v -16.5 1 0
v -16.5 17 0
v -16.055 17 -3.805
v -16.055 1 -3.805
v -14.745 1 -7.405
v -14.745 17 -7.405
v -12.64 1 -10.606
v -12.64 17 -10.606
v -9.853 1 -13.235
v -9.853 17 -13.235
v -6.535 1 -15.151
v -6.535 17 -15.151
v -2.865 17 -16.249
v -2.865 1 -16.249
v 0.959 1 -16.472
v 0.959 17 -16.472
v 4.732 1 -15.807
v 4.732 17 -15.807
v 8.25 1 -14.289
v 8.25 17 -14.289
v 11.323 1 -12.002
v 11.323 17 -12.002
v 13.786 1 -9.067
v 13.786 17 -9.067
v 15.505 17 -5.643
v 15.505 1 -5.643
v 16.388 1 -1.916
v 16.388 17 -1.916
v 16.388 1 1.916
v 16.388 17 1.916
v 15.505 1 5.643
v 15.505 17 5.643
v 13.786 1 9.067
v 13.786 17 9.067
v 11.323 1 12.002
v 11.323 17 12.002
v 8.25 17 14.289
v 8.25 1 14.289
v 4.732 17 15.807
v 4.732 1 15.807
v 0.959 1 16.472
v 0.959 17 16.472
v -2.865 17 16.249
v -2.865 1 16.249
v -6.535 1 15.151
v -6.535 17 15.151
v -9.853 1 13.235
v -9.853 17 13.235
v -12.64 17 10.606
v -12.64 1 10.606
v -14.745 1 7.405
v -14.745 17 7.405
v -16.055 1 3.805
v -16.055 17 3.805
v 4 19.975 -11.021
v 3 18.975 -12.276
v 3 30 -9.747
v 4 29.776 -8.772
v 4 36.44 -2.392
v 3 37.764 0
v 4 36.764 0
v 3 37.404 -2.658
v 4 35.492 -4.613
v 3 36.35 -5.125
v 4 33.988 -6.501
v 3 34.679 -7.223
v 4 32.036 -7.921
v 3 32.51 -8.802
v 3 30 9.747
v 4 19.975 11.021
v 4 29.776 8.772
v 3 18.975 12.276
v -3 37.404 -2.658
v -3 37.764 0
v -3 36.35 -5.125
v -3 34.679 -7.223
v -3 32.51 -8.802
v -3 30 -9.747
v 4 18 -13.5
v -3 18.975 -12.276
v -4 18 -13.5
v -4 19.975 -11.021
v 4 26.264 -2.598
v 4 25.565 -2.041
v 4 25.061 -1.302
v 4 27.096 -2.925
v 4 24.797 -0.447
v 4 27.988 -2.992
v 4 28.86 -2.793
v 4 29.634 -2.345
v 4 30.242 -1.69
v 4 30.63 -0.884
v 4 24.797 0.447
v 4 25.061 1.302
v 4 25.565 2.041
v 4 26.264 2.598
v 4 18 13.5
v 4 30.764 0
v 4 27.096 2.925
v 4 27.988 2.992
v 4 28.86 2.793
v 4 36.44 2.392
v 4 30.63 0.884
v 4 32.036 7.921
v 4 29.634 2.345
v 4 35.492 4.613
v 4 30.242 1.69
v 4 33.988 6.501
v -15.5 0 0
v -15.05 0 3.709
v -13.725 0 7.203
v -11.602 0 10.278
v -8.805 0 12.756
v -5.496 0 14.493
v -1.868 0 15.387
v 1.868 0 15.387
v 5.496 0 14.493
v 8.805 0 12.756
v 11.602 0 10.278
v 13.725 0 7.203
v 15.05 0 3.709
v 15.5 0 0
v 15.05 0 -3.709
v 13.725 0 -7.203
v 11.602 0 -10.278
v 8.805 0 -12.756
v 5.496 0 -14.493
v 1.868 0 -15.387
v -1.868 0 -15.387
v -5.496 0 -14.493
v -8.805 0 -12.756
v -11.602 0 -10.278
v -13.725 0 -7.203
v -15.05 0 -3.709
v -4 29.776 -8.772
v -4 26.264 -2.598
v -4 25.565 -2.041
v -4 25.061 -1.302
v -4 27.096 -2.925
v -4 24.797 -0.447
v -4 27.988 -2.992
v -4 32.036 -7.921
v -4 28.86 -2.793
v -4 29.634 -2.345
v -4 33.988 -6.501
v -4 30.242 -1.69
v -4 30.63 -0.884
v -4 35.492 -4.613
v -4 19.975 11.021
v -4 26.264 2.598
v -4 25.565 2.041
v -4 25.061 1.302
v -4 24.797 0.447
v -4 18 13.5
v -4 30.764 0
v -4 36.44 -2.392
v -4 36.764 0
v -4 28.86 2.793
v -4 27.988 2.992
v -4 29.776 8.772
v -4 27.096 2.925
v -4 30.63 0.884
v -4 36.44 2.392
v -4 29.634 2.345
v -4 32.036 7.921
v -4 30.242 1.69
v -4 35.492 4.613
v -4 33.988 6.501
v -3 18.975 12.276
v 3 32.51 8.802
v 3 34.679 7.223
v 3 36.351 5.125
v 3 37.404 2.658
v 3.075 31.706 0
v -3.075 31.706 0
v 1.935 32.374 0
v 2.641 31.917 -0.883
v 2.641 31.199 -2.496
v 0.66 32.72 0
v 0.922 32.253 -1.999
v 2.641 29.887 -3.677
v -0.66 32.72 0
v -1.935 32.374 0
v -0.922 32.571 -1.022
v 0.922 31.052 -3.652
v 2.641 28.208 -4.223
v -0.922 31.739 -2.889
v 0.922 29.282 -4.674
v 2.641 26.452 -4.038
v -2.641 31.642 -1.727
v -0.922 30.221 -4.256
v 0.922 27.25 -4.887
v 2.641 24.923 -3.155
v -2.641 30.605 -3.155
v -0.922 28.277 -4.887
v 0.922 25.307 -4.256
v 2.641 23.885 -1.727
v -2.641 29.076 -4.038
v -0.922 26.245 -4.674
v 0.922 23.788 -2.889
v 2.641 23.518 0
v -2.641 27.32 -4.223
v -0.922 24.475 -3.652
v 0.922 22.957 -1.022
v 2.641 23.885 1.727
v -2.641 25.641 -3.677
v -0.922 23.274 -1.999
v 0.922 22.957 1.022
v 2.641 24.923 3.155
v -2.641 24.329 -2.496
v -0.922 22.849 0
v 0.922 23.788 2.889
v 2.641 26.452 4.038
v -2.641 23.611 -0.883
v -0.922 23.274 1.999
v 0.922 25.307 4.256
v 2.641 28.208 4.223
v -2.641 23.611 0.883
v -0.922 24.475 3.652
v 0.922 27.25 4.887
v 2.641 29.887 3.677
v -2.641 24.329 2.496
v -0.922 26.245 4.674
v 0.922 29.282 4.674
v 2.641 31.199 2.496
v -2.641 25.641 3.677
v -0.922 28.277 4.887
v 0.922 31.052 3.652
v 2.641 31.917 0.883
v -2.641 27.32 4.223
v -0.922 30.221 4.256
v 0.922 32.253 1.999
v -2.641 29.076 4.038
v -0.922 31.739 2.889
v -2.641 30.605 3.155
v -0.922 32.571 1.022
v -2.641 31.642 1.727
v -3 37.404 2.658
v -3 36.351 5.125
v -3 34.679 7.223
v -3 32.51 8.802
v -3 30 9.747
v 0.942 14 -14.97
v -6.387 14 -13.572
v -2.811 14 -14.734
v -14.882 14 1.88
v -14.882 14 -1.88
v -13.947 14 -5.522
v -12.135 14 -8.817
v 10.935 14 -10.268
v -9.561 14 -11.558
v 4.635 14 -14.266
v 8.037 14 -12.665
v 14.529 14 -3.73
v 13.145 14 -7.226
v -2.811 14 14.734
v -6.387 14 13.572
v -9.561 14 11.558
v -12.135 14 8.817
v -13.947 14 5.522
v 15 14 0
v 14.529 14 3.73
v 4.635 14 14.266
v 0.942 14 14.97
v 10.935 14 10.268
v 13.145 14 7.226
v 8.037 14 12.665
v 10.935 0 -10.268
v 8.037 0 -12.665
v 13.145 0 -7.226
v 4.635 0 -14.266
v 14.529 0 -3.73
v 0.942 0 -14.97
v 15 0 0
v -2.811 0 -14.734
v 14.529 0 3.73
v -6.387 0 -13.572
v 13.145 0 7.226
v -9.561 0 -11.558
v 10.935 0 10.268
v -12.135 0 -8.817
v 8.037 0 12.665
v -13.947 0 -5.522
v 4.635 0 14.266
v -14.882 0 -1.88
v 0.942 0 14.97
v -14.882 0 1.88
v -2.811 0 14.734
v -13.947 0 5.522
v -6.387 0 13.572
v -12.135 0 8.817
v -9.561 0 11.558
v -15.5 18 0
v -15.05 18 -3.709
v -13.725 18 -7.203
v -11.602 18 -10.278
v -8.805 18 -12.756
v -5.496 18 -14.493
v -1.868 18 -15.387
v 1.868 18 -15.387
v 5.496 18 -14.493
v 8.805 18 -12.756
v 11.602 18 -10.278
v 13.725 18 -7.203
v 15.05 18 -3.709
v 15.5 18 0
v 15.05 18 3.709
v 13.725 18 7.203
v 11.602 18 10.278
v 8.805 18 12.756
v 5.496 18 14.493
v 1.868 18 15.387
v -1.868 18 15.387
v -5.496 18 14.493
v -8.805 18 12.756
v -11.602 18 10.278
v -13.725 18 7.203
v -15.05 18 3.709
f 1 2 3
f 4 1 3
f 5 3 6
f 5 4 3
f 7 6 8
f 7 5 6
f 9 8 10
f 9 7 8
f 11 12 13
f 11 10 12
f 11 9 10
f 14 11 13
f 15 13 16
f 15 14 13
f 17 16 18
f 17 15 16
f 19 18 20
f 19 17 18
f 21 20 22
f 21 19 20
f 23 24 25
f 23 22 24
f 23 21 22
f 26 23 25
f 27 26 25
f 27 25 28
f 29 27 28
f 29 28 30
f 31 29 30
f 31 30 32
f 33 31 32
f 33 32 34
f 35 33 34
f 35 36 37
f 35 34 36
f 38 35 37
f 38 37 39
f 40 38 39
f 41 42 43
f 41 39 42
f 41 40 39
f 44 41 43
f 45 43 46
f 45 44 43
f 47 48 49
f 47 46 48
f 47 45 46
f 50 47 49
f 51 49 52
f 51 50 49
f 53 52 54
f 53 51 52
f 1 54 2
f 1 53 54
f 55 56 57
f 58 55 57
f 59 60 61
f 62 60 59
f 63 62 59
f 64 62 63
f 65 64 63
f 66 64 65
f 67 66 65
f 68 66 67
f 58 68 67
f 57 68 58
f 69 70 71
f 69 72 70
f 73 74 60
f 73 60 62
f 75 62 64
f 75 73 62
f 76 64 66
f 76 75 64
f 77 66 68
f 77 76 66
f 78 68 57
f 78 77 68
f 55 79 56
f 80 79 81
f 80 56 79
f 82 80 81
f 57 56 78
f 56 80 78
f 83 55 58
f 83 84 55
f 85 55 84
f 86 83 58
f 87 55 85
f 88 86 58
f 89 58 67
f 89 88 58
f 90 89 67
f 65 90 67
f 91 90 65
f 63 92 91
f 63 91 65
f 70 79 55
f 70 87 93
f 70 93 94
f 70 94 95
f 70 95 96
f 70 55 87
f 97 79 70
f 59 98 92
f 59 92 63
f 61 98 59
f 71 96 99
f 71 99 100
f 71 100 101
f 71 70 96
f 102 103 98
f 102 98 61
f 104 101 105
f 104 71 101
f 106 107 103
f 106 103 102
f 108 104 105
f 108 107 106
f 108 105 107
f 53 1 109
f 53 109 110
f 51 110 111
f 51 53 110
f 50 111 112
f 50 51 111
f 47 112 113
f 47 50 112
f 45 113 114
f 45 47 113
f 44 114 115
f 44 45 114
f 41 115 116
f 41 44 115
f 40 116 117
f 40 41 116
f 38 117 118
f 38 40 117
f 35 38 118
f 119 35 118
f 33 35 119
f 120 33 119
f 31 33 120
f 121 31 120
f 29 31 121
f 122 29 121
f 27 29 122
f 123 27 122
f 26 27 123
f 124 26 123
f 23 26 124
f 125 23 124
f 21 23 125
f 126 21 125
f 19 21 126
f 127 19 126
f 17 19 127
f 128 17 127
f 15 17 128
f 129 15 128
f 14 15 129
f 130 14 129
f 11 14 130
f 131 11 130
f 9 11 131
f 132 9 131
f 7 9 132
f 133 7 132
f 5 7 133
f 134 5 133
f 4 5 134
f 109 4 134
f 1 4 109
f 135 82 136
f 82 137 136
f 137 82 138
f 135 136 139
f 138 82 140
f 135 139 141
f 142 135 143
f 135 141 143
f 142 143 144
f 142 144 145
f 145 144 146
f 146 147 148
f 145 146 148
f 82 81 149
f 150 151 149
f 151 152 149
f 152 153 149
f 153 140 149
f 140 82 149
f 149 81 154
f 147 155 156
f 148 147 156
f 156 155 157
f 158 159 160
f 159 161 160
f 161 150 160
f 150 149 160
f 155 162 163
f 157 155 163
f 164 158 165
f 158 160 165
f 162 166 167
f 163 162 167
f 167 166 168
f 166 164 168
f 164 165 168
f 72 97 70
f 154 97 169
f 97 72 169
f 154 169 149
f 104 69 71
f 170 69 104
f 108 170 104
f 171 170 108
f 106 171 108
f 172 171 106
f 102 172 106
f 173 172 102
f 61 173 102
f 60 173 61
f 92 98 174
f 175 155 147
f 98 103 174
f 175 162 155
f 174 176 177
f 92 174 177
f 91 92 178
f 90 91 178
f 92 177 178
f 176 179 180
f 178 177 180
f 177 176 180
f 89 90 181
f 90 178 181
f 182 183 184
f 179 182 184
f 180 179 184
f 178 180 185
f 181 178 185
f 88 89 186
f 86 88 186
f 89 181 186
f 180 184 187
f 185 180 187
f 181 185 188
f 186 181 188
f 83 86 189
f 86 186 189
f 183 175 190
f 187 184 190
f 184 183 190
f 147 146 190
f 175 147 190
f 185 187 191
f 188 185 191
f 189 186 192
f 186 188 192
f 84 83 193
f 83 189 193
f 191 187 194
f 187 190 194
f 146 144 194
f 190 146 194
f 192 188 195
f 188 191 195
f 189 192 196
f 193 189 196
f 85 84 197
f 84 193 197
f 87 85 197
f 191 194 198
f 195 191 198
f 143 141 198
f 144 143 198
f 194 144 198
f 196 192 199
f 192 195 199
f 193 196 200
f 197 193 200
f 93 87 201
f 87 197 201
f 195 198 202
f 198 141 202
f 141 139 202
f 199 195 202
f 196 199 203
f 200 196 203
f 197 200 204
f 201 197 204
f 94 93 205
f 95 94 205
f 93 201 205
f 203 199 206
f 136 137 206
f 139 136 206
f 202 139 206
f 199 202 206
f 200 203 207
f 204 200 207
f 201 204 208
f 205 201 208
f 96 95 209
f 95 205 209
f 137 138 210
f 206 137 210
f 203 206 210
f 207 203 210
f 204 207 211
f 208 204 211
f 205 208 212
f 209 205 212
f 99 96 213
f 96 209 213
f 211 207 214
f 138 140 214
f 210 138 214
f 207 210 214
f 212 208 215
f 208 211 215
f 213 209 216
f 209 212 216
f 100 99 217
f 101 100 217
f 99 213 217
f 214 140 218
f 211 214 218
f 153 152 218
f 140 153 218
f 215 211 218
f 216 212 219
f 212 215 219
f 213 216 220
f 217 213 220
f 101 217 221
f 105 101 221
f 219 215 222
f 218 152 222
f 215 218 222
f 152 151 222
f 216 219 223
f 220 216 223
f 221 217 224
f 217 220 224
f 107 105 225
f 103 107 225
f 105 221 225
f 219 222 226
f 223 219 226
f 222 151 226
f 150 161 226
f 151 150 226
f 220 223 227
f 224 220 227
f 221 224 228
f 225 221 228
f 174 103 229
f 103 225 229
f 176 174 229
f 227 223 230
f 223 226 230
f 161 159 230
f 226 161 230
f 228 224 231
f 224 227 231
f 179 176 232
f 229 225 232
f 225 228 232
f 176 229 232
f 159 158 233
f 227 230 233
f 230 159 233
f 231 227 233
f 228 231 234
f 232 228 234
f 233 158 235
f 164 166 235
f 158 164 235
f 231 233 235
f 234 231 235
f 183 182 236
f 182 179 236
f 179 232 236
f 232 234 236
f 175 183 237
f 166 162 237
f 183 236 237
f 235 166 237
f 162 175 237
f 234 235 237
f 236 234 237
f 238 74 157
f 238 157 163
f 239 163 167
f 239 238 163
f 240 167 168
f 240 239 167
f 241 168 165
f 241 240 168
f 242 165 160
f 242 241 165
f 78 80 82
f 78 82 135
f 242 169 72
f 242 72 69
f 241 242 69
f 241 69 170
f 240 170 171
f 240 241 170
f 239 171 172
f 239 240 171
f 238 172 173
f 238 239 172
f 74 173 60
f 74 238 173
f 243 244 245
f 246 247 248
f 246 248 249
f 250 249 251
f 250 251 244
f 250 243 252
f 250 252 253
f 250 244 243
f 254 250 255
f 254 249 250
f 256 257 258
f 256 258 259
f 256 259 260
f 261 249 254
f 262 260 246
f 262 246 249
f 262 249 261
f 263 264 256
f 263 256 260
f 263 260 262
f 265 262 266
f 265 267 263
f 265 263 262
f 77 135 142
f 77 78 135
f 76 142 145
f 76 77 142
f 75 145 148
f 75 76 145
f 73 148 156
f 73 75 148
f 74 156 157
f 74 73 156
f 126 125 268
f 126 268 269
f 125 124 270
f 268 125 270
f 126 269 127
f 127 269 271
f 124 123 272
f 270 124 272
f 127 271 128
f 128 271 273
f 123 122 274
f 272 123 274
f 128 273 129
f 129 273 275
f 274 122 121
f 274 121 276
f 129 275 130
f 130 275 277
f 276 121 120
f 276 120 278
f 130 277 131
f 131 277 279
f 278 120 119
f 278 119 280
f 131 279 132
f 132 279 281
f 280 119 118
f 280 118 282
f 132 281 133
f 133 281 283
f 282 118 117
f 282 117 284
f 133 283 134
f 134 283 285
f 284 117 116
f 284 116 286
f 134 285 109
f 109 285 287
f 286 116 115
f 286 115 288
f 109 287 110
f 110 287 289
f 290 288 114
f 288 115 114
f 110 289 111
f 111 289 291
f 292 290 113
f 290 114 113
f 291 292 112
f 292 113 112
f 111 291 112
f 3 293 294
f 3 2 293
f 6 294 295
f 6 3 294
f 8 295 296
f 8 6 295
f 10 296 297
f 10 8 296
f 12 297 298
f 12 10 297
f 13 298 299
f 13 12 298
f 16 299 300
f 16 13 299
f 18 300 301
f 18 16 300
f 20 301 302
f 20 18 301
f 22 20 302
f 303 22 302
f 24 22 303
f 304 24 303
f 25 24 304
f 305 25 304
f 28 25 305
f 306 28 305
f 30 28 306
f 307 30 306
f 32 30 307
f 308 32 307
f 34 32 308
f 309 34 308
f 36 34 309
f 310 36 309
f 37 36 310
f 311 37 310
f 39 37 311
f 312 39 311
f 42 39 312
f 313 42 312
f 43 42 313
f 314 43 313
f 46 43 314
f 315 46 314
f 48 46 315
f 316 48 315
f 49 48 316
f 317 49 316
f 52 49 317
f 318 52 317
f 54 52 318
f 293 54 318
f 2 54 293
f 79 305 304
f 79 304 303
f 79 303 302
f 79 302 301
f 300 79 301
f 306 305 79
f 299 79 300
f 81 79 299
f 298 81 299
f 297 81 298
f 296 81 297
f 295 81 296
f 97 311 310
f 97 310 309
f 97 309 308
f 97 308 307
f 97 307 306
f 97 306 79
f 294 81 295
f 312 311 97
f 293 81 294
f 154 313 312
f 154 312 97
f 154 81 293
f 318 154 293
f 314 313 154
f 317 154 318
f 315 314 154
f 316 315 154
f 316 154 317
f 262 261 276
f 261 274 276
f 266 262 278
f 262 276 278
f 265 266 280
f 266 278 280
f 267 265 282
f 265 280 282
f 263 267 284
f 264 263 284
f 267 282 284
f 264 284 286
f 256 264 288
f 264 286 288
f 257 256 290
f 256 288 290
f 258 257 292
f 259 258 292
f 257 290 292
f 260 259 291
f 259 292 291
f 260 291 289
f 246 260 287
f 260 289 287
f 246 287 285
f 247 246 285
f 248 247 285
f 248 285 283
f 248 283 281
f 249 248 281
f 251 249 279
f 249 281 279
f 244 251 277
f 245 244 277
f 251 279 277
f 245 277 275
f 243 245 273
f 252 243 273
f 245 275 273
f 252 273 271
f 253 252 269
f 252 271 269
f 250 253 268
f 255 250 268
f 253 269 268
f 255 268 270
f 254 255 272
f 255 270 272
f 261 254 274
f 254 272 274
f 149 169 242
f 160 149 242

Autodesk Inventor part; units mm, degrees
ref_plane "YZ Plane" through (0, 0, 0) normal (1, 0, 0) x (0, 1, 0)
ref_plane "XZ Plane" through (0, 0, 0) normal (0, 1, 0) x (-1, 0, 0)
ref_plane "XY Plane" through (0, 0, 0) normal (0, 0, 1) x (1, 0, 0)
sketch "Boceto1" plane through (0, 0, 0) normal (0, 1, 0) x (-1, 0, 0)
  circle A0 centre (0, 0) radius 16.5
  dimension "d0" = 33
extrude "Extrusión1" add sketch "Boceto1" along normal blind 18
sketch "Boceto3" plane through (0, 0, 0) normal (1, 0, 0) x (0, 1, 0)
  line L0 (18, -16.5) -> (18, 16.5) projected
  line L1 (18, -12.5) -> (30, -9.7467)
  arc A0 (30, -9.7467) -> (37.7637, 0) centre (27.7637, 0) ccw
  line L2 (18, 0) -> (51.6641, 0)
  line L3 (18, 12.5) -> (30, 9.7467)
  arc A1 (37.7637, 0) -> (30, 9.7467) centre (27.7637, 0) ccw
  line L4 (18, 12.5) -> (18, -12.5)
  point P0 (0, 0)
  dimension "d5" = 10
  dimension "d6" = 4
  dimension "d7" = 12
extrude "Extrusión2" add sketch "Boceto3" along normal mid plane 8
sketch "Boceto4" plane through (4, 0, 0) normal (1, 0, 0) x (0, 0, -1)
  arc A0 (9.7467, 30) -> (-9.7467, 30) centre (0, 27.7637) ccw projected
  circle A1 centre (0, 27.7637) radius 3
  point P0 (0, 0)
  dimension "d10" = 6
extrude "Extrusión3" cut sketch "Boceto4" against normal through all
sketch "Boceto6" plane through (0, 0, 0) normal (0, -1, 0) x (1, 0, 0)
  circle A0 centre (0, 0) radius 15
  dimension "d14" = 30
extrude "Extrusión4" cut sketch "Boceto6" against normal blind 14
chamfer "Chaflán1" distance 1 angle 45 10 edges at (16.5, 18, 0) (16.5, 0, 0) (-4, 37.7637, 0) (-4, 24, -11.1234) (-4, 24, 11.1234) (4, 37.7637, 0) (4, 24, 11.1234) (4, 24, -11.1234) (0, 18, 12.5) (0, 18, -12.5)
sketch "Boceto7" plane through (0, 0, 0) normal (0, 0, 1) x (1, 0, 0)
  arc A0 (5, 27.7637) -> (-5, 27.7637) centre (0, 27.7637) ccw
  line L0 (4, 36.7637) -> (4, 29.7764) projected
  line L1 (-4, 29.7764) -> (-4, 36.7637) projected
  line L2 (-4, 29.7764) -> (-4, 19.9747) projected
  line L3 (4, 19.9747) -> (4, 29.7764) projected
  line L4 (4, 30.7637) -> (-4, 30.7637) projected
  line L5 (4, 24.7637) -> (-4, 24.7637) projected
  line L6 (8.3579, 27.7637) -> (-7.6994, 27.7637)
  point P0 (0, 0)
  dimension "d20" = 5
revolve "Revolución1" cut sketch "Boceto7" angle 360 about axis through (8.3579, 27.7637, 0) along (-1, 0, 0) contours L6 L3 L0 A0 | L4 A0 | L0 L3 L6 L2 L1 L4 | L1 L2 L6 A0
properties part number "shocks_fixed" material "Goma"
